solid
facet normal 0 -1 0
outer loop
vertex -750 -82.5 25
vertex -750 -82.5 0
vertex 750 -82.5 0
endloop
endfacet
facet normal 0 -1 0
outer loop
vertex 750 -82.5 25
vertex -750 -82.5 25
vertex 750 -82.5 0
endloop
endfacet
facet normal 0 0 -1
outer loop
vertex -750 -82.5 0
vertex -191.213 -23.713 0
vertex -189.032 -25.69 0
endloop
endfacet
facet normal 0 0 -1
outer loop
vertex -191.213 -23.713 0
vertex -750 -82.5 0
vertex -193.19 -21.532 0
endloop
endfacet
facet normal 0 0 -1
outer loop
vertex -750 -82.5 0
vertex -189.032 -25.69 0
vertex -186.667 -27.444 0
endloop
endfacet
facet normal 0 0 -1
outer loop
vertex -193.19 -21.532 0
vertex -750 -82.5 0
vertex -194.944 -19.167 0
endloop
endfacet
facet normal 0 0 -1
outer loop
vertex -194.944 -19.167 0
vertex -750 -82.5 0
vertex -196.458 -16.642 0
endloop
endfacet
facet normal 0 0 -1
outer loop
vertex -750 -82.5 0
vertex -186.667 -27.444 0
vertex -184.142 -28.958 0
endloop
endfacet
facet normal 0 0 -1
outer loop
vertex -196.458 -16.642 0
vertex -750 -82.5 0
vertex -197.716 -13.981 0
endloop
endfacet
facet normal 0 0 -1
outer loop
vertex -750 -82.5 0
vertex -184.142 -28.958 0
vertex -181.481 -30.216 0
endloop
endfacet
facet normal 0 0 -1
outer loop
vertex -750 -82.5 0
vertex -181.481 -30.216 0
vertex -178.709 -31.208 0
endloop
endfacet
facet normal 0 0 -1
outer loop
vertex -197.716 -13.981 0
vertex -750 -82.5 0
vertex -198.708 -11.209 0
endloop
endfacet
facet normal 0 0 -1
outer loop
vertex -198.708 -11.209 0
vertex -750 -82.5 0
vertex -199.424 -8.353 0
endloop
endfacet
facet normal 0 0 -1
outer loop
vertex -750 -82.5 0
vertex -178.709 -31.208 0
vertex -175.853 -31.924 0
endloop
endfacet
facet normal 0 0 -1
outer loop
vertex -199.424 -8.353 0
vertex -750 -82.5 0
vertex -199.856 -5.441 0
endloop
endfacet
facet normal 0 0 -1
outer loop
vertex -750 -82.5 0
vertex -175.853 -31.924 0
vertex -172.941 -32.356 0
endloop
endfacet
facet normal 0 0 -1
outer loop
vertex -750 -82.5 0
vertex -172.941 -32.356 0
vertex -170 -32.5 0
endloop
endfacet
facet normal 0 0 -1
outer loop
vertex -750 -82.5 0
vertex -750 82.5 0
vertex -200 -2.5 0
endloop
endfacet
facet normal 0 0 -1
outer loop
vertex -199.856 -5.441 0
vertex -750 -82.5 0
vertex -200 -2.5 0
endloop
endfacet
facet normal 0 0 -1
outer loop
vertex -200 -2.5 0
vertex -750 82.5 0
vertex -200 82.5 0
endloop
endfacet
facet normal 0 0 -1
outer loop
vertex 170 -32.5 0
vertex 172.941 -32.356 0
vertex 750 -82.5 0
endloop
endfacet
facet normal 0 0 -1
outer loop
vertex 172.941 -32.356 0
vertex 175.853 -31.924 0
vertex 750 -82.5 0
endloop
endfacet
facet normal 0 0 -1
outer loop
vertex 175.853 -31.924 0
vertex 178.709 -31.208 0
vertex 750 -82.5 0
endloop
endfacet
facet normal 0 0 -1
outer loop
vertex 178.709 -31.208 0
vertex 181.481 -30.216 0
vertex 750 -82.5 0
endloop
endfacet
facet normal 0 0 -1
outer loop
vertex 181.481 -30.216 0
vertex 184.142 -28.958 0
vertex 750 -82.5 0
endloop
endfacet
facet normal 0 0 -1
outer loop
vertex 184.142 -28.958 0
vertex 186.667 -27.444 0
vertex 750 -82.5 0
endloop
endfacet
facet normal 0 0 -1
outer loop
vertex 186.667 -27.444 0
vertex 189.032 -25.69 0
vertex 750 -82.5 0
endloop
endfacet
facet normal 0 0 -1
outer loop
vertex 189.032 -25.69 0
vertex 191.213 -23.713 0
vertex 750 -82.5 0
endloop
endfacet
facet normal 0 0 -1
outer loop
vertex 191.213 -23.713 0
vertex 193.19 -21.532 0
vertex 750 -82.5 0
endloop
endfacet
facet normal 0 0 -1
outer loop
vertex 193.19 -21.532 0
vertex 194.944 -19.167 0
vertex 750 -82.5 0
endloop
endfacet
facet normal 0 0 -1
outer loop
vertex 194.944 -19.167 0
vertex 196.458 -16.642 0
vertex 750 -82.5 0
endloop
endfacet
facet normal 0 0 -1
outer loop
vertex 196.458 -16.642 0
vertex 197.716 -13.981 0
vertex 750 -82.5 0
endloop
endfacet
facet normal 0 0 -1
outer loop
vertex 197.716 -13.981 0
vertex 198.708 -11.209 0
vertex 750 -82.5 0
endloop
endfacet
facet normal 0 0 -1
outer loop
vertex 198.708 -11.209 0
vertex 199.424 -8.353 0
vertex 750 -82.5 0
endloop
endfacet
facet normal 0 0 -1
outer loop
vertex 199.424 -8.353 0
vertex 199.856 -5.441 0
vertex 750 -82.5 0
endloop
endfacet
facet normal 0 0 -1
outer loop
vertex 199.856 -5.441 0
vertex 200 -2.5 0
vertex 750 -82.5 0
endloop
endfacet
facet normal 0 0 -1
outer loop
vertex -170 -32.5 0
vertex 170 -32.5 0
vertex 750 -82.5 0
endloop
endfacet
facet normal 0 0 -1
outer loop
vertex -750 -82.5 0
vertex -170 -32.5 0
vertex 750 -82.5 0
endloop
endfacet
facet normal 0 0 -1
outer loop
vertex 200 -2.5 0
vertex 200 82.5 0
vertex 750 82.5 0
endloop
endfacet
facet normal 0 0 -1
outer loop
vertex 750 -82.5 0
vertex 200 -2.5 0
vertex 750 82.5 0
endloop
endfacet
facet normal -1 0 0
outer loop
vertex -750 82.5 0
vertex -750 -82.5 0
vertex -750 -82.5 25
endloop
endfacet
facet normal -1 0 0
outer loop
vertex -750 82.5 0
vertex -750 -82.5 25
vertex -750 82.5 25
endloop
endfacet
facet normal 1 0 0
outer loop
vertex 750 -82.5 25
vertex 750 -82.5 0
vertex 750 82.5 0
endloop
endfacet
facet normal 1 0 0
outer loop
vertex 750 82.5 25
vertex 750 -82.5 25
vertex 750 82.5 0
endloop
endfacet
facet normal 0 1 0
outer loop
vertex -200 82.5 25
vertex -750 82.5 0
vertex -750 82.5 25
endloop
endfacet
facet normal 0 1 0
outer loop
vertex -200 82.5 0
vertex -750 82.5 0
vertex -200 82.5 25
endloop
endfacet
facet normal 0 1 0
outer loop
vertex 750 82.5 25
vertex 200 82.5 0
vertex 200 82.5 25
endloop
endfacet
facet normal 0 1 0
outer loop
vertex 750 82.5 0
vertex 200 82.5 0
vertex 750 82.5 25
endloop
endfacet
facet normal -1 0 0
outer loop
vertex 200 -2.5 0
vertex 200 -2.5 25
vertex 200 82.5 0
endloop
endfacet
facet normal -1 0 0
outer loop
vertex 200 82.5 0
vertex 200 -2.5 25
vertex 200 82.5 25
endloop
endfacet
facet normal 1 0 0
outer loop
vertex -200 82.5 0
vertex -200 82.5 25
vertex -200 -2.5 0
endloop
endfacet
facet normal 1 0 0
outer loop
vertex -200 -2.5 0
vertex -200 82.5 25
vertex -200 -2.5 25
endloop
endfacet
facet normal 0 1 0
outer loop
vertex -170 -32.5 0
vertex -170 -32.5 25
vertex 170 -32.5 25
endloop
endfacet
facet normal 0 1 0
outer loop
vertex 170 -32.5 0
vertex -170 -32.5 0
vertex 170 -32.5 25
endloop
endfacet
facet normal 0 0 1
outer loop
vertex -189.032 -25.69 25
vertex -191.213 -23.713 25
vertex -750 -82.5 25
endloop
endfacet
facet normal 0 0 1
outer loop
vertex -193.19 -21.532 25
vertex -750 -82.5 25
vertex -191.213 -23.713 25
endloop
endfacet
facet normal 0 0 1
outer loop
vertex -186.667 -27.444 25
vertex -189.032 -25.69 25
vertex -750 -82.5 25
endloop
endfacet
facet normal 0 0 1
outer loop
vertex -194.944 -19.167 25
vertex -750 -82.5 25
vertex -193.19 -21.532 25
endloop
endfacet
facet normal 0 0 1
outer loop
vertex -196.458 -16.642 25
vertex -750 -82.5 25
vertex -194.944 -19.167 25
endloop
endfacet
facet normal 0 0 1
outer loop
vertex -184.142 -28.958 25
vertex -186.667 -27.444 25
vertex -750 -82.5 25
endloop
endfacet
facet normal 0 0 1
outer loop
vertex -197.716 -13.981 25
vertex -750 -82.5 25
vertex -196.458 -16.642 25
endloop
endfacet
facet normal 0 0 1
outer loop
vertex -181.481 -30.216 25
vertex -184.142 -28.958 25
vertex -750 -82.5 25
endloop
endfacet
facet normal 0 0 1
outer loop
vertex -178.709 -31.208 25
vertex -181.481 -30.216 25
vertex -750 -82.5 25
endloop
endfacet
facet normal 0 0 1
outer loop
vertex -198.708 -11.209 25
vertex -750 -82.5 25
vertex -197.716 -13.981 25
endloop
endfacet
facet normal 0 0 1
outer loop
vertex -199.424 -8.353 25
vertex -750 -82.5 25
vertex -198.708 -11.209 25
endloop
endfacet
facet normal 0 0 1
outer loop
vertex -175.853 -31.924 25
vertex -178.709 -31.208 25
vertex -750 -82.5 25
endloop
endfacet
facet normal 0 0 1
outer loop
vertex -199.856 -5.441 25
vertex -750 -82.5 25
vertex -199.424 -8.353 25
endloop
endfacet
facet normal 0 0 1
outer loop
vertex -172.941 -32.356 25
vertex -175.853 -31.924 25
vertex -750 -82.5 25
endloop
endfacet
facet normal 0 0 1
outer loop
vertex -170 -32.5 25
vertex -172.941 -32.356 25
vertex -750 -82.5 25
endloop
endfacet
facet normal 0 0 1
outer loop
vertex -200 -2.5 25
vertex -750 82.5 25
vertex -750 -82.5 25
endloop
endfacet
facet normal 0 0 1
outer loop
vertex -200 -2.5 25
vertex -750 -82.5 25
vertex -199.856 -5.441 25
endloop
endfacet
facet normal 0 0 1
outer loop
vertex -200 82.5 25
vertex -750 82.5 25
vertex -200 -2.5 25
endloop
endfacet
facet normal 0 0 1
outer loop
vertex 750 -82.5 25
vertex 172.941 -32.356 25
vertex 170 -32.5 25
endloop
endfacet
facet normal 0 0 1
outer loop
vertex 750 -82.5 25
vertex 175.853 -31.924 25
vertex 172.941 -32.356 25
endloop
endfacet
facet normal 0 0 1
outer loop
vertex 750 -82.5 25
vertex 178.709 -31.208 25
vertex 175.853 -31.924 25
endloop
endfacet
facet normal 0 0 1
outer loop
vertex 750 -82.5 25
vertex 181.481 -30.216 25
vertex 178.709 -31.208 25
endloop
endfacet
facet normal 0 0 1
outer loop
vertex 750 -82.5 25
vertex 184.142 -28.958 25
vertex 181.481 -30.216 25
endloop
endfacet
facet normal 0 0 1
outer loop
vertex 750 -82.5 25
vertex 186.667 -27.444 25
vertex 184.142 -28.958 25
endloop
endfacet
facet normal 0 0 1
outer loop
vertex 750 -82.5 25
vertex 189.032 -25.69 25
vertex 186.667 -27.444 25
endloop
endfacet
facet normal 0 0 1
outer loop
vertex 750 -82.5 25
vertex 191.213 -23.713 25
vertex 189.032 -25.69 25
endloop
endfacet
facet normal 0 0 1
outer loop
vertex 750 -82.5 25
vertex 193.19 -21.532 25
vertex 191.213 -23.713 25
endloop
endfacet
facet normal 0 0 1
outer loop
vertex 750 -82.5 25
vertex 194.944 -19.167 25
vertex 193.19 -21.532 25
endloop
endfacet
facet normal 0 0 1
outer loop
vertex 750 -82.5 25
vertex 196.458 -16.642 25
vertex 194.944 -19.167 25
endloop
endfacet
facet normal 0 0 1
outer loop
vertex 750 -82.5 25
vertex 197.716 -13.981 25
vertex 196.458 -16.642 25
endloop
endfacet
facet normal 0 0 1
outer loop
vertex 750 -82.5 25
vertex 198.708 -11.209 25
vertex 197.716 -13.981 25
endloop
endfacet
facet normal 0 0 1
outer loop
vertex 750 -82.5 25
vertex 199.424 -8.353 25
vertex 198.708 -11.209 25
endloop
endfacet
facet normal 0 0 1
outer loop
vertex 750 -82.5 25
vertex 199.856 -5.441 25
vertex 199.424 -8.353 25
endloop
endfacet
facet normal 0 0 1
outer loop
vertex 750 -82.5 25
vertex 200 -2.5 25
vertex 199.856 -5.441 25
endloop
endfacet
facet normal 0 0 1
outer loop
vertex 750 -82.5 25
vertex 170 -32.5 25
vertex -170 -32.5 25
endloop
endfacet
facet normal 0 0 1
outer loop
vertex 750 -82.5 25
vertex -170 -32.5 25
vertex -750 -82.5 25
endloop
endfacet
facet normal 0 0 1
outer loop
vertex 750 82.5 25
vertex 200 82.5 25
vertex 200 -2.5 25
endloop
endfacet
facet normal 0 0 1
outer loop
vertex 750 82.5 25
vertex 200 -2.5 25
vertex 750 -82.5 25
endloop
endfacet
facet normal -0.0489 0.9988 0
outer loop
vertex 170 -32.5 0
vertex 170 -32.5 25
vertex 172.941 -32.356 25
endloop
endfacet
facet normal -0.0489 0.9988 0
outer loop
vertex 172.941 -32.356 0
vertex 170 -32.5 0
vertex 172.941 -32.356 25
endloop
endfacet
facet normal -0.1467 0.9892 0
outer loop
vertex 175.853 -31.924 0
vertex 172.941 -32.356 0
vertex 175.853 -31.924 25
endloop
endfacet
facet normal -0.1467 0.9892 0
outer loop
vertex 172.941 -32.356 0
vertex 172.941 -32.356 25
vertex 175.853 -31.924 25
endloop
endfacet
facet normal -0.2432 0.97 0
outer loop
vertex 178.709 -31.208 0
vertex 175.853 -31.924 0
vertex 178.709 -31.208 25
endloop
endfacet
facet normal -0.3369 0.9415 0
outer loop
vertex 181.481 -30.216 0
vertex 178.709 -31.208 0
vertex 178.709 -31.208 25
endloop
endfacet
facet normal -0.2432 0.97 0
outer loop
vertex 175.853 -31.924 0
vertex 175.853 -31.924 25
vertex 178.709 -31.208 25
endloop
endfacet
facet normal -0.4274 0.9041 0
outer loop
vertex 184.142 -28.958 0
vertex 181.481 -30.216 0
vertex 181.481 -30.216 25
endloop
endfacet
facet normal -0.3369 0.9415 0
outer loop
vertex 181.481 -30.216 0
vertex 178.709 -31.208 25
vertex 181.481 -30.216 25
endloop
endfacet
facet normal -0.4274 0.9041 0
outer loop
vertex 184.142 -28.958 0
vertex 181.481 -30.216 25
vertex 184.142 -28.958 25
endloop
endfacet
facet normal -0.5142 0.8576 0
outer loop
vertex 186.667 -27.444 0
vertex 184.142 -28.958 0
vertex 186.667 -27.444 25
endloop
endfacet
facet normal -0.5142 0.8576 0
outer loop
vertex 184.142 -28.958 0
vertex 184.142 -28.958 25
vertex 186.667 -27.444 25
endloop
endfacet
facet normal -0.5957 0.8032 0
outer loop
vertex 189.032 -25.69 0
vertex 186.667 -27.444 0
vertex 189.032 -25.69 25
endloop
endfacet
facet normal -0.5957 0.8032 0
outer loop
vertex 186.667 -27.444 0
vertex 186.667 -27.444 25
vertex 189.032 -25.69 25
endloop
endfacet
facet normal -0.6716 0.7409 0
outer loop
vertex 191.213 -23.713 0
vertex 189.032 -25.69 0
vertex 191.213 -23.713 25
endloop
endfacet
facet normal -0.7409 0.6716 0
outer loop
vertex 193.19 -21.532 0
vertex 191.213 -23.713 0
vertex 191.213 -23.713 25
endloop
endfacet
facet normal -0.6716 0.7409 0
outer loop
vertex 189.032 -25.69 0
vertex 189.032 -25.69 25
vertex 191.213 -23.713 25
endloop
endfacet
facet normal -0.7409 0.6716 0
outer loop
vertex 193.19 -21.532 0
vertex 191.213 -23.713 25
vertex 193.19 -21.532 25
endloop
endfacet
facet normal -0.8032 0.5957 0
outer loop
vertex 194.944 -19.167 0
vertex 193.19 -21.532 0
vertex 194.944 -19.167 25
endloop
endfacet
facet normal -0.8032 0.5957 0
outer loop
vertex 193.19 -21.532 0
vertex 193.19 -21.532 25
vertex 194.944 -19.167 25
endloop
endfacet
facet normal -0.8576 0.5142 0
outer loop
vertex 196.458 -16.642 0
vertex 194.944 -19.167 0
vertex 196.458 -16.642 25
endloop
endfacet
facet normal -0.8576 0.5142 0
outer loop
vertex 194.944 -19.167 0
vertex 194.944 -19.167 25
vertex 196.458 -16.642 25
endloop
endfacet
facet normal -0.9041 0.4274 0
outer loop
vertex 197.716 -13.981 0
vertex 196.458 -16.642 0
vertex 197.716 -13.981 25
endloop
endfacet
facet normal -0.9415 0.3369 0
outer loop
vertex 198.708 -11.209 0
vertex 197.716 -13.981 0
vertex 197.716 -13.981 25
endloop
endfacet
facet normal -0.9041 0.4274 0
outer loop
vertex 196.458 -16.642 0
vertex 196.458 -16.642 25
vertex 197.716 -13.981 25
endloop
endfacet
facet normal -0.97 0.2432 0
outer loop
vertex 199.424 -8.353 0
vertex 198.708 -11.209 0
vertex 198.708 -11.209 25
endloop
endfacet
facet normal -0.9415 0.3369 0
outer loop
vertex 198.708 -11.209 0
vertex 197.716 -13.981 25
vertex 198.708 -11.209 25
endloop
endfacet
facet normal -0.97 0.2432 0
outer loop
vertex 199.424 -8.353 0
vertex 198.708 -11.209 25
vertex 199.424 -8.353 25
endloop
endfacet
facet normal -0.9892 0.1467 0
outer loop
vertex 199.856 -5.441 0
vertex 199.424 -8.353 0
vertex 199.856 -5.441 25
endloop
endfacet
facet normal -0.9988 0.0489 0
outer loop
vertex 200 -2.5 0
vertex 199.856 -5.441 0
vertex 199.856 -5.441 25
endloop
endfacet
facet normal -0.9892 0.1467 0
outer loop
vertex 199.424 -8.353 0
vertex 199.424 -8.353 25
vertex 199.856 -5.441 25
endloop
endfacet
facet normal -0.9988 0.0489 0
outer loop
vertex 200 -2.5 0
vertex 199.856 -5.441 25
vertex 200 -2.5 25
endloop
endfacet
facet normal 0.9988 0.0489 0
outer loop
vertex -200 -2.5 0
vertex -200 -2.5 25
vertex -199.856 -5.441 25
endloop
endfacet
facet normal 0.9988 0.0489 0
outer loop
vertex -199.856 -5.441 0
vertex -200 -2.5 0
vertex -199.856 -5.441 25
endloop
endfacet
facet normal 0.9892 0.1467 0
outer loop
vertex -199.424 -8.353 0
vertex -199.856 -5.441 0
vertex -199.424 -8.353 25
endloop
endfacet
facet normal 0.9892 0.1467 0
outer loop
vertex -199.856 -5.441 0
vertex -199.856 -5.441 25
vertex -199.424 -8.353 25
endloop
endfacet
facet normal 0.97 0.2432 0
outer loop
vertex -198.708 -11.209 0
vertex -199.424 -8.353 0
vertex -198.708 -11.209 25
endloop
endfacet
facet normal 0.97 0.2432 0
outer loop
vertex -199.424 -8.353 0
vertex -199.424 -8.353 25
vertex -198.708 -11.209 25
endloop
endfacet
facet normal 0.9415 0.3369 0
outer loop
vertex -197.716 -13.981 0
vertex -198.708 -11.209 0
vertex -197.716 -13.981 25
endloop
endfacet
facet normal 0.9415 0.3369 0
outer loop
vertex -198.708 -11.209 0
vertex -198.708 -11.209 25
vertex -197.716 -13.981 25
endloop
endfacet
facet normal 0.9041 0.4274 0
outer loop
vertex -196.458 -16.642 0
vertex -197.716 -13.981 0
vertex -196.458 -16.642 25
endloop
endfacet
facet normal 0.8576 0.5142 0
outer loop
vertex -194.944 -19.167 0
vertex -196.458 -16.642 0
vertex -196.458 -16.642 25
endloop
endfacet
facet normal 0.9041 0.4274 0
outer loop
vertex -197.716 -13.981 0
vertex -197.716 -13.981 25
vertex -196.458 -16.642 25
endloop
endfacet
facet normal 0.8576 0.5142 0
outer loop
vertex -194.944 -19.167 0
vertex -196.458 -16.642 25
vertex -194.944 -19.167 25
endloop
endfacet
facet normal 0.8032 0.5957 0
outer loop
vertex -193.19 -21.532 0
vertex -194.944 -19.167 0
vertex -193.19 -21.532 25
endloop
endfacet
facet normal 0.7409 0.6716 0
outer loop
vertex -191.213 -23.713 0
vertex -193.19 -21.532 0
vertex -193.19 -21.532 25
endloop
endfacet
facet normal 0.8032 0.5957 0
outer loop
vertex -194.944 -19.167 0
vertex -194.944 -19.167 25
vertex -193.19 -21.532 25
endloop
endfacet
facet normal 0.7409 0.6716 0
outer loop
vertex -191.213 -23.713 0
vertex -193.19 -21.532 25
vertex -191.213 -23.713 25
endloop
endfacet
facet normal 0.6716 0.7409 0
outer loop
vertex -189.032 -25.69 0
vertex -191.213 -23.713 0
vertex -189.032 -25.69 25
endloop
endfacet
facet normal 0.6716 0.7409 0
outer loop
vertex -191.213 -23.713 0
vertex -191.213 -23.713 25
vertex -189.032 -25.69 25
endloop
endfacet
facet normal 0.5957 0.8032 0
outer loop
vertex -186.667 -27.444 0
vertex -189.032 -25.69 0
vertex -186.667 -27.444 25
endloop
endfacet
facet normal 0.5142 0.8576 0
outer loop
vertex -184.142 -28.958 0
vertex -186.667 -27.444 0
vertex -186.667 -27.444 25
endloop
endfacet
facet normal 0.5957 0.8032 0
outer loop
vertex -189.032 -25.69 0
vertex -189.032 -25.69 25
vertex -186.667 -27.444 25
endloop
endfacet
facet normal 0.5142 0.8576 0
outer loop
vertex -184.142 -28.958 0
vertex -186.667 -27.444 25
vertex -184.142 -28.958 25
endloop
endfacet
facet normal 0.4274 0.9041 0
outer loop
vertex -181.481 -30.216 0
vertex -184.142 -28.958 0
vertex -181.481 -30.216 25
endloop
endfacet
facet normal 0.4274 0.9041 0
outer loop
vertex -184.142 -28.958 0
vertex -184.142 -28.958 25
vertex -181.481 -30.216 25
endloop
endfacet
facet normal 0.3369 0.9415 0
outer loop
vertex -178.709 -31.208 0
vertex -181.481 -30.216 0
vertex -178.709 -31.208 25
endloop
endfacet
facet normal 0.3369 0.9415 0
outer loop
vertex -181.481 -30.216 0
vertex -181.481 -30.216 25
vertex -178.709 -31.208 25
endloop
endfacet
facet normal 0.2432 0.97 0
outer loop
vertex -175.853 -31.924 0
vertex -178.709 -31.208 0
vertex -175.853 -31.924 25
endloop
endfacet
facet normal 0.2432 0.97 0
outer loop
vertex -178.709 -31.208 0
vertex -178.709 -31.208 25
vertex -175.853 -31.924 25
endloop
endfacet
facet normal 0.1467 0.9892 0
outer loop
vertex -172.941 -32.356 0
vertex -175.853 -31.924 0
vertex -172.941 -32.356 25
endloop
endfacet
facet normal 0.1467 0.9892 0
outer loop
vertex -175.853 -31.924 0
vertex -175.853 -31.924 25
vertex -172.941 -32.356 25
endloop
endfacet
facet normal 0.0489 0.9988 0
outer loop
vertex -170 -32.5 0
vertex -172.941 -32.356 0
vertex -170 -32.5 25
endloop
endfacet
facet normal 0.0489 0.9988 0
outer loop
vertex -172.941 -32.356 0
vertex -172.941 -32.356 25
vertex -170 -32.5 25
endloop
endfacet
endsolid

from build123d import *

# Parameters (mm, degrees)
F0_W     = 1500
F0_H     = 165
F1_DEPTH = 25
F3_DEPTH = 25


with BuildPart() as f1:
    # F0 (on Top) → F1 (new body)
    with BuildSketch(Plane.XY):
        Rectangle(F0_W, F0_H)
    extrude(amount=F1_DEPTH)

    # F2 (on face) → F3 (cut, through all)
    with BuildSketch(Plane.XY.offset(25)):
        with BuildLine():
            Line((200, 82.5), (-200, 82.5))
            Line((-200, 82.5), (-200, -2.5))
            ThreePointArc((-200, -2.5), (-191.213203, -23.713203), (-170, -32.5))
            Line((-170, -32.5), (0, -32.5))
            Line((0, -32.5), (170, -32.5))
            ThreePointArc((170, -32.5), (191.213203, -23.713203), (200, -2.5))
            Line((200, -2.5), (200, 82.5))
        make_face()
    extrude(amount=-F3_DEPTH, mode=Mode.SUBTRACT)


solid = f1.part
